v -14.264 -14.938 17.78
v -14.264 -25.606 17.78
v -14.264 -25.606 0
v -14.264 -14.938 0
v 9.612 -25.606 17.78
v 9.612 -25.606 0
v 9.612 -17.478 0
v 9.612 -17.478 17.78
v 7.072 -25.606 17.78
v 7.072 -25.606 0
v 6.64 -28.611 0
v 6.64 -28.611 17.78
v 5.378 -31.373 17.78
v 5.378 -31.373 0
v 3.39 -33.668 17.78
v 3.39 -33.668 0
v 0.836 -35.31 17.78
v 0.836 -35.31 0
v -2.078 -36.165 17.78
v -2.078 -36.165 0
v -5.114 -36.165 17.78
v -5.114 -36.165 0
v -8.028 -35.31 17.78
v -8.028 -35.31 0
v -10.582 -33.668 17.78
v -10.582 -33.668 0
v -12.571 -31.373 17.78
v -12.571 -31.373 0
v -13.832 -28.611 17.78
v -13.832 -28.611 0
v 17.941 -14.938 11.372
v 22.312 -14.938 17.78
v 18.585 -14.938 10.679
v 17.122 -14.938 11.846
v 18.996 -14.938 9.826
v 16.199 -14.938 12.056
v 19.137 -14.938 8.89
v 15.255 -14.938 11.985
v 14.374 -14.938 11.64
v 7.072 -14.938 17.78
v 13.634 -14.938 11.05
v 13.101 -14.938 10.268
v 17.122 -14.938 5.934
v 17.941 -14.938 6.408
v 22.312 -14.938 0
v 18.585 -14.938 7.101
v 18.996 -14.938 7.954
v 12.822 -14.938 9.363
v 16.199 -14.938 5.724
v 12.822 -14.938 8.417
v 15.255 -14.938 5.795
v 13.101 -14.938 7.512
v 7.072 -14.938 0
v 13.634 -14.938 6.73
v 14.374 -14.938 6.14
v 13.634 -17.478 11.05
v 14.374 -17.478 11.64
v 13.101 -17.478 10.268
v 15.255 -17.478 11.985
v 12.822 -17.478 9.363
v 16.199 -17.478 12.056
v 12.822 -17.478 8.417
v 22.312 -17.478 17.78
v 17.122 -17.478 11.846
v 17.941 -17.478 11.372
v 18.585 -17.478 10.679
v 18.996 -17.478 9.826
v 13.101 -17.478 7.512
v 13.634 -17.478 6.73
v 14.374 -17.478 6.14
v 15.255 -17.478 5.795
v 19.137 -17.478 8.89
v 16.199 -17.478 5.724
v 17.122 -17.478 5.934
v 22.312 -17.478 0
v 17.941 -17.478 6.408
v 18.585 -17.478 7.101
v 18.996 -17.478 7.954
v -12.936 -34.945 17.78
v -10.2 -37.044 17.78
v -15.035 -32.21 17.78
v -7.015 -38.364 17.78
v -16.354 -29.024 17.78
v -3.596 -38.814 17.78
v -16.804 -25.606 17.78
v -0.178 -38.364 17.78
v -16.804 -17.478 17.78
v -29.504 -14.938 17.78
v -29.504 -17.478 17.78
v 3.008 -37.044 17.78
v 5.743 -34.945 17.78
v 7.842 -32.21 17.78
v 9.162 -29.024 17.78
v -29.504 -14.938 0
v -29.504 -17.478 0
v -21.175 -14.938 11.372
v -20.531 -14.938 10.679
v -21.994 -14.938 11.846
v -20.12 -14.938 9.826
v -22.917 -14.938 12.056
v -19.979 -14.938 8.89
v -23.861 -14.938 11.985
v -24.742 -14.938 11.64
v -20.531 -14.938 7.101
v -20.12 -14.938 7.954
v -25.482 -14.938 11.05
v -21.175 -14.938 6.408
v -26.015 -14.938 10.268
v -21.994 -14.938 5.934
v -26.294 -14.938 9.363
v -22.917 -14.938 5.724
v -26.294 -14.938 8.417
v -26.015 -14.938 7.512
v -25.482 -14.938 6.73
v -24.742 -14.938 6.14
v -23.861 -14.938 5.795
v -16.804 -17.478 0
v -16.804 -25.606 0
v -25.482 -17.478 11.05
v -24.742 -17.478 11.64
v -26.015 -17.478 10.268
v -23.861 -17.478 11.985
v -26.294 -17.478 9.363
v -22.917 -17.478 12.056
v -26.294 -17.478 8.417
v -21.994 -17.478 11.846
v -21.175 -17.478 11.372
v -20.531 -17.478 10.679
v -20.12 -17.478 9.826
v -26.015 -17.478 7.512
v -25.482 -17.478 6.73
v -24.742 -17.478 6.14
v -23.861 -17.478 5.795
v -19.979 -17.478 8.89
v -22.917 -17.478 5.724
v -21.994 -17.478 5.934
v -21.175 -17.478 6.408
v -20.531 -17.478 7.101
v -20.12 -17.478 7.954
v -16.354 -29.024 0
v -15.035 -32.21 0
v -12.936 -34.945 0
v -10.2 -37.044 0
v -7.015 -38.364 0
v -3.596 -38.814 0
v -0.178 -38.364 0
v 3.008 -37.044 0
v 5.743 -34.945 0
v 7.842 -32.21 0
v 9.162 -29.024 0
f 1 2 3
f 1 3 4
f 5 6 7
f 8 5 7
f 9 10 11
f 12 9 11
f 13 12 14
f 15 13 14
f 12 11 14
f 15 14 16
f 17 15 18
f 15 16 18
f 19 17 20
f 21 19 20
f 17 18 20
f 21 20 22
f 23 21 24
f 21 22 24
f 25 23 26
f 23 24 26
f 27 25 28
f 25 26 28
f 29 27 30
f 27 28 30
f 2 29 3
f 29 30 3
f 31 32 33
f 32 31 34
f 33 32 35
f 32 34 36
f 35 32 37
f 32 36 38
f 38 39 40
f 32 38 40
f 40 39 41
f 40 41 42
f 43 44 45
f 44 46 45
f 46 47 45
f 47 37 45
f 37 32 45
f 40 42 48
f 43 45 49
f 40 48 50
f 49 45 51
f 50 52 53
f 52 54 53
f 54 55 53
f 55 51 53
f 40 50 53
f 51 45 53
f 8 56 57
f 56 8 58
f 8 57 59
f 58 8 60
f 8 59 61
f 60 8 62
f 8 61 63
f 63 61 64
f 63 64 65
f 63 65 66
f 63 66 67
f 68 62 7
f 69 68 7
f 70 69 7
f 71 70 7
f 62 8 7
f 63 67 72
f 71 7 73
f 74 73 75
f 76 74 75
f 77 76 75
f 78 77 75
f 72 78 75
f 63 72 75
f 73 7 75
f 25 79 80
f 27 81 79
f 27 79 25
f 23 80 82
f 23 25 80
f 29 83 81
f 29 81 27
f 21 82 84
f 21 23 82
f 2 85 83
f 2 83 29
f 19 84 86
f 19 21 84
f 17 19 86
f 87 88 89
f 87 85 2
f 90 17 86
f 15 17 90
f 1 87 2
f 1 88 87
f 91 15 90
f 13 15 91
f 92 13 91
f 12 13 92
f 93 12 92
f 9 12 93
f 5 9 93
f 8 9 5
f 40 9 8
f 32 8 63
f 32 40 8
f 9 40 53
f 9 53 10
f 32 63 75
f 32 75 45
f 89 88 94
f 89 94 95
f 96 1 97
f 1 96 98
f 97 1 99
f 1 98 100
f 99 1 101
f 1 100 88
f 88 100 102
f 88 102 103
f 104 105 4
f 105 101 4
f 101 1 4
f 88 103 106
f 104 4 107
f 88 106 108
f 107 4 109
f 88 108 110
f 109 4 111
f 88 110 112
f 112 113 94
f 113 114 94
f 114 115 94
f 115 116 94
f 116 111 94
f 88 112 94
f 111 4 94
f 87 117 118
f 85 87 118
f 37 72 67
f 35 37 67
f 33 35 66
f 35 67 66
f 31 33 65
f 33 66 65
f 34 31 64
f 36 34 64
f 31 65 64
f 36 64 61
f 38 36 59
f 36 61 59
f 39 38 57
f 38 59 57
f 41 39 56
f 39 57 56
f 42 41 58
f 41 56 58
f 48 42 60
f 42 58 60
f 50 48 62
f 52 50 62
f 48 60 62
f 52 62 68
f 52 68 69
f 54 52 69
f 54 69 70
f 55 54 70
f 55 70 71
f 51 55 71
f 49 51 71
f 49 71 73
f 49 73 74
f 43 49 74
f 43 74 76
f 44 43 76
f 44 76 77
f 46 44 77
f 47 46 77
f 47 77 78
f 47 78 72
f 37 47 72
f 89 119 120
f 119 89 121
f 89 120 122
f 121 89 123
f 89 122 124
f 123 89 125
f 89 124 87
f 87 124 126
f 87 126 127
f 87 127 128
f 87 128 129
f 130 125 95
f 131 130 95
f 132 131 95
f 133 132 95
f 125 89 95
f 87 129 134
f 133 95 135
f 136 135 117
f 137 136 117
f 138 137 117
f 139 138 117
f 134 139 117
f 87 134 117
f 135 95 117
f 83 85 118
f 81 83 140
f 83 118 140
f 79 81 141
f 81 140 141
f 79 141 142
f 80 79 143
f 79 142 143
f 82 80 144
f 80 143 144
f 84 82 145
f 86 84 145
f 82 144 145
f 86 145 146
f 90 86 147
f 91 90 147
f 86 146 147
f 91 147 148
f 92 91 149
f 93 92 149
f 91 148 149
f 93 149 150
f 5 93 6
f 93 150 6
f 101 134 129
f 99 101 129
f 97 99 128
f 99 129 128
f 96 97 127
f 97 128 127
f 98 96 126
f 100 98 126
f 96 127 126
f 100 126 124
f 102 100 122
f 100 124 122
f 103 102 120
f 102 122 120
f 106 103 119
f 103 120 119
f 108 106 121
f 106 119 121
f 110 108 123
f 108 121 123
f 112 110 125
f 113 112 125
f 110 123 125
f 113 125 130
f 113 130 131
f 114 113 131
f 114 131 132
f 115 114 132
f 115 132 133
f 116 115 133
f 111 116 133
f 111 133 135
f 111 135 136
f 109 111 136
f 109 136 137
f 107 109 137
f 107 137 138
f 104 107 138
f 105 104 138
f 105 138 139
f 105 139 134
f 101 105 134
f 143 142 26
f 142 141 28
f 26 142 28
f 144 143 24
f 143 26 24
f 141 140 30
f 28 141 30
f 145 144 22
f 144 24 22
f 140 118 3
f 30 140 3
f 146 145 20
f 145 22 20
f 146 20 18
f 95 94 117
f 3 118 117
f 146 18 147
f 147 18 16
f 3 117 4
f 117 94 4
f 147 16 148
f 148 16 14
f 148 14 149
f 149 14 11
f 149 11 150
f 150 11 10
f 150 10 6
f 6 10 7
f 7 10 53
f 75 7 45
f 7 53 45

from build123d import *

# Parameters (mm, degrees)
F1_DEPTH = 17.78
F2_R     = 3.175
F3_DEPTH = 2.541


with BuildPart() as f1:
    # F0 (on Top) → F1 (new body)
    with BuildSketch(Plane.XY):
        with BuildLine():
            Line((-16.804146, -14.937672), (-29.504146, -14.937672))
            Line((-29.504146, -14.937672), (-29.504146, -17.477672))
            Line((-29.504146, -17.477672), (-16.804146, -17.477672))
            Line((-16.804146, -17.477672), (-16.804146, -25.605672))
            ThreePointArc((-16.804146, -25.605672), (-3.596146, -38.813672), (9.611854, -25.605672))
            Line((9.611854, -25.605672), (9.611854, -17.477672))
            Line((9.611854, -17.477672), (22.311854, -17.477672))
            Line((22.311854, -17.477672), (22.311854, -14.937672))
            Line((22.311854, -14.937672), (9.611854, -14.937672))
            Line((9.611854, -14.937672), (7.071854, -14.937672))
            Line((7.071854, -14.937672), (7.071854, -25.605672))
            ThreePointArc((7.071854, -25.605672), (-3.596146, -36.273672), (-14.264146, -25.605672))
            Line((-14.264146, -25.605672), (-14.264146, -14.937672))
            Line((-14.264146, -14.937672), (-16.804146, -14.937672))
        make_face()
    extrude(amount=F1_DEPTH)

    # F2 (on face) → F3 (cut, through all)
    with BuildSketch(Plane.XZ.offset(17.477672)):
        with Locations((-23.154146, 8.89)):
            Circle(F2_R)
        with Locations((15.961854, 8.89)):
            Circle(F2_R)
    extrude(amount=-F3_DEPTH, mode=Mode.SUBTRACT)


solid = f1.part
